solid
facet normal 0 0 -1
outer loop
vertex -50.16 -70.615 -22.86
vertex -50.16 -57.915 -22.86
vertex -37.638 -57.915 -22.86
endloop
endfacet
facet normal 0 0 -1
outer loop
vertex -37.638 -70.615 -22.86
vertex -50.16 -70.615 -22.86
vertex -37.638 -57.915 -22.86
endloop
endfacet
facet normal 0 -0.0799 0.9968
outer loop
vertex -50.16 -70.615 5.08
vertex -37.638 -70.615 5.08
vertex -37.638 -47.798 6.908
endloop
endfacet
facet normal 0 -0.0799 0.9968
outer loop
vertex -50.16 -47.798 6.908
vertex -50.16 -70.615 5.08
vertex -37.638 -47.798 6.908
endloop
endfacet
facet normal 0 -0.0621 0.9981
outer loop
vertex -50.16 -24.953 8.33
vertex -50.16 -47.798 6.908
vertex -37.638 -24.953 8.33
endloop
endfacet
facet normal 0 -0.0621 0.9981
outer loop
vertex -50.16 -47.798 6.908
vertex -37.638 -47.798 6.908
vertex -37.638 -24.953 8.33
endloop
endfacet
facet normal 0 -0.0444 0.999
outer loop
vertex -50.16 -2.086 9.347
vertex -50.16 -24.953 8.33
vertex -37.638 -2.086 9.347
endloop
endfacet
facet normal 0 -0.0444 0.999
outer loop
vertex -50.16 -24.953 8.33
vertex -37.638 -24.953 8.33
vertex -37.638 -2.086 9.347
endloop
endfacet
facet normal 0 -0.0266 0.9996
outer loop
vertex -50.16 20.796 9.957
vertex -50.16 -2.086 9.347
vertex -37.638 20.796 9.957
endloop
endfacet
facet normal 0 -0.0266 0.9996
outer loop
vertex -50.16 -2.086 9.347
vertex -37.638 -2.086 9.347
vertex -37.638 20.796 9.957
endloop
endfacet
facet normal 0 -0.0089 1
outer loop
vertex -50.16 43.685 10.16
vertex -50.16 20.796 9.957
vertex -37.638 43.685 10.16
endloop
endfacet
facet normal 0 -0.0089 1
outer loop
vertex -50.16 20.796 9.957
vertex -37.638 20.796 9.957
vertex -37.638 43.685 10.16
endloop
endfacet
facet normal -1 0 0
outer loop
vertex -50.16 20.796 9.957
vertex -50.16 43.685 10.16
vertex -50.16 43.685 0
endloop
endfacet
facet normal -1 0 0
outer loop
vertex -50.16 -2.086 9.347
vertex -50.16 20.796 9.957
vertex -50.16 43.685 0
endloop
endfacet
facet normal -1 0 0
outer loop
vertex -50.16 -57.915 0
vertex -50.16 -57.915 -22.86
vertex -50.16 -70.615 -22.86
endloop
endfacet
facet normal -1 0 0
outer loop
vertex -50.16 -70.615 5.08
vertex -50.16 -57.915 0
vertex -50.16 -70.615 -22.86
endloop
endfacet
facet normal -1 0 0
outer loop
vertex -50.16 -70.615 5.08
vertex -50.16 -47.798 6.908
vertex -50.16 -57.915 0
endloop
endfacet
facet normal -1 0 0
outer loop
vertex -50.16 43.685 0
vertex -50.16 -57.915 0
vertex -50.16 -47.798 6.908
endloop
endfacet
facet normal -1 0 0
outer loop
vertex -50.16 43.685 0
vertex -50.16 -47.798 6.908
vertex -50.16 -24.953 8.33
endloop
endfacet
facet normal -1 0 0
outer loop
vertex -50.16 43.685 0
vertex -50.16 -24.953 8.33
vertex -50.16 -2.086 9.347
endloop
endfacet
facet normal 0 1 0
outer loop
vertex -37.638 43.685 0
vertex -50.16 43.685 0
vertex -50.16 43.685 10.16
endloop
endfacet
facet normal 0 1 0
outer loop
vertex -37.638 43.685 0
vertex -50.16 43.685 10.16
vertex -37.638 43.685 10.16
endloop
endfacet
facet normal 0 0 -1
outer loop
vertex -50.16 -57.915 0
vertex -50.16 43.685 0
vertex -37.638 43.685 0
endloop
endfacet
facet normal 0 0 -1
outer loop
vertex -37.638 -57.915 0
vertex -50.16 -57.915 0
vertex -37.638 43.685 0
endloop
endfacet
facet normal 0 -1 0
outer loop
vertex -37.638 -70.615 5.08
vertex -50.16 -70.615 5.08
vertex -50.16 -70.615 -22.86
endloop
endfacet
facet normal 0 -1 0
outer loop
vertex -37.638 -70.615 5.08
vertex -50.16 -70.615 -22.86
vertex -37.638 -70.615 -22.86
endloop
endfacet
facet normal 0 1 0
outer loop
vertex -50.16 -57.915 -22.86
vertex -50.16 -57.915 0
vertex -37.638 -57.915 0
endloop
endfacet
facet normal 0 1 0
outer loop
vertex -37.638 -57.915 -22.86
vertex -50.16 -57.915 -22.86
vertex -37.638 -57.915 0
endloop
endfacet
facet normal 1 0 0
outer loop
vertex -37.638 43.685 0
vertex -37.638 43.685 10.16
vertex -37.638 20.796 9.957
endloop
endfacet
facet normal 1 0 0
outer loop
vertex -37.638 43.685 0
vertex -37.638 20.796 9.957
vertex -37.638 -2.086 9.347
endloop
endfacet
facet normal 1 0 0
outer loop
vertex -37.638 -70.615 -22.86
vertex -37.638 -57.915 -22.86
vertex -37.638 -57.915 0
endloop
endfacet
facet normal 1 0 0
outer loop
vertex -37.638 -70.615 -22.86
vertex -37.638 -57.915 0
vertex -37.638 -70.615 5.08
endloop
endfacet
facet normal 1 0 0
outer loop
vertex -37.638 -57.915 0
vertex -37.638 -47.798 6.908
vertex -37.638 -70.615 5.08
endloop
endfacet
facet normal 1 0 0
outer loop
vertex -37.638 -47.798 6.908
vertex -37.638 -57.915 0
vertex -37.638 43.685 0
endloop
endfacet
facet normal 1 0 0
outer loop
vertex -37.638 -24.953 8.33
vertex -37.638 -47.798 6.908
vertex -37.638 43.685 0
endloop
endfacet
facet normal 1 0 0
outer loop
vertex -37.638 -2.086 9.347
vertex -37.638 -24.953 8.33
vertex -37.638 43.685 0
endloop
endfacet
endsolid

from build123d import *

# Parameters (mm, degrees)
F0_W     = 12.5222
F0_H     = 114.3
F1_DEPTH = 10.16
F3_DEPTH = 25.4
F4_W     = 12.5222
F4_H     = 12.7
F5_DEPTH = 22.86


with BuildPart() as f1:
    # F0 (on Top) → F1 (new body)
    with BuildSketch(Plane.XY):
        with Locations((-43.899023, -13.46517)):
            Rectangle(F0_W, F0_H)
    extrude(amount=F1_DEPTH)

    # F2 (on face) → F3 (cut)
    with BuildSketch(Plane.YZ.offset(-37.637923)):
        with BuildLine():
            ThreePointArc((-70.61517, 5.08), (-13.521586, 8.889373), (43.68483, 10.16))
            Line((43.68483, 10.16), (-70.61517, 10.16))
            Line((-70.61517, 10.16), (-70.61517, 5.08))
        make_face()
    extrude(amount=-F3_DEPTH, mode=Mode.SUBTRACT)

    # F4 (on face) → F5 (join)
    with BuildSketch(Plane(origin=(0, 0, 0), x_dir=(1, 0, 0), z_dir=(0, 0, -1))):
        with Locations((-43.899023, 64.26517)):
            Rectangle(F4_W, F4_H)
    extrude(amount=F5_DEPTH)


solid = f1.part
